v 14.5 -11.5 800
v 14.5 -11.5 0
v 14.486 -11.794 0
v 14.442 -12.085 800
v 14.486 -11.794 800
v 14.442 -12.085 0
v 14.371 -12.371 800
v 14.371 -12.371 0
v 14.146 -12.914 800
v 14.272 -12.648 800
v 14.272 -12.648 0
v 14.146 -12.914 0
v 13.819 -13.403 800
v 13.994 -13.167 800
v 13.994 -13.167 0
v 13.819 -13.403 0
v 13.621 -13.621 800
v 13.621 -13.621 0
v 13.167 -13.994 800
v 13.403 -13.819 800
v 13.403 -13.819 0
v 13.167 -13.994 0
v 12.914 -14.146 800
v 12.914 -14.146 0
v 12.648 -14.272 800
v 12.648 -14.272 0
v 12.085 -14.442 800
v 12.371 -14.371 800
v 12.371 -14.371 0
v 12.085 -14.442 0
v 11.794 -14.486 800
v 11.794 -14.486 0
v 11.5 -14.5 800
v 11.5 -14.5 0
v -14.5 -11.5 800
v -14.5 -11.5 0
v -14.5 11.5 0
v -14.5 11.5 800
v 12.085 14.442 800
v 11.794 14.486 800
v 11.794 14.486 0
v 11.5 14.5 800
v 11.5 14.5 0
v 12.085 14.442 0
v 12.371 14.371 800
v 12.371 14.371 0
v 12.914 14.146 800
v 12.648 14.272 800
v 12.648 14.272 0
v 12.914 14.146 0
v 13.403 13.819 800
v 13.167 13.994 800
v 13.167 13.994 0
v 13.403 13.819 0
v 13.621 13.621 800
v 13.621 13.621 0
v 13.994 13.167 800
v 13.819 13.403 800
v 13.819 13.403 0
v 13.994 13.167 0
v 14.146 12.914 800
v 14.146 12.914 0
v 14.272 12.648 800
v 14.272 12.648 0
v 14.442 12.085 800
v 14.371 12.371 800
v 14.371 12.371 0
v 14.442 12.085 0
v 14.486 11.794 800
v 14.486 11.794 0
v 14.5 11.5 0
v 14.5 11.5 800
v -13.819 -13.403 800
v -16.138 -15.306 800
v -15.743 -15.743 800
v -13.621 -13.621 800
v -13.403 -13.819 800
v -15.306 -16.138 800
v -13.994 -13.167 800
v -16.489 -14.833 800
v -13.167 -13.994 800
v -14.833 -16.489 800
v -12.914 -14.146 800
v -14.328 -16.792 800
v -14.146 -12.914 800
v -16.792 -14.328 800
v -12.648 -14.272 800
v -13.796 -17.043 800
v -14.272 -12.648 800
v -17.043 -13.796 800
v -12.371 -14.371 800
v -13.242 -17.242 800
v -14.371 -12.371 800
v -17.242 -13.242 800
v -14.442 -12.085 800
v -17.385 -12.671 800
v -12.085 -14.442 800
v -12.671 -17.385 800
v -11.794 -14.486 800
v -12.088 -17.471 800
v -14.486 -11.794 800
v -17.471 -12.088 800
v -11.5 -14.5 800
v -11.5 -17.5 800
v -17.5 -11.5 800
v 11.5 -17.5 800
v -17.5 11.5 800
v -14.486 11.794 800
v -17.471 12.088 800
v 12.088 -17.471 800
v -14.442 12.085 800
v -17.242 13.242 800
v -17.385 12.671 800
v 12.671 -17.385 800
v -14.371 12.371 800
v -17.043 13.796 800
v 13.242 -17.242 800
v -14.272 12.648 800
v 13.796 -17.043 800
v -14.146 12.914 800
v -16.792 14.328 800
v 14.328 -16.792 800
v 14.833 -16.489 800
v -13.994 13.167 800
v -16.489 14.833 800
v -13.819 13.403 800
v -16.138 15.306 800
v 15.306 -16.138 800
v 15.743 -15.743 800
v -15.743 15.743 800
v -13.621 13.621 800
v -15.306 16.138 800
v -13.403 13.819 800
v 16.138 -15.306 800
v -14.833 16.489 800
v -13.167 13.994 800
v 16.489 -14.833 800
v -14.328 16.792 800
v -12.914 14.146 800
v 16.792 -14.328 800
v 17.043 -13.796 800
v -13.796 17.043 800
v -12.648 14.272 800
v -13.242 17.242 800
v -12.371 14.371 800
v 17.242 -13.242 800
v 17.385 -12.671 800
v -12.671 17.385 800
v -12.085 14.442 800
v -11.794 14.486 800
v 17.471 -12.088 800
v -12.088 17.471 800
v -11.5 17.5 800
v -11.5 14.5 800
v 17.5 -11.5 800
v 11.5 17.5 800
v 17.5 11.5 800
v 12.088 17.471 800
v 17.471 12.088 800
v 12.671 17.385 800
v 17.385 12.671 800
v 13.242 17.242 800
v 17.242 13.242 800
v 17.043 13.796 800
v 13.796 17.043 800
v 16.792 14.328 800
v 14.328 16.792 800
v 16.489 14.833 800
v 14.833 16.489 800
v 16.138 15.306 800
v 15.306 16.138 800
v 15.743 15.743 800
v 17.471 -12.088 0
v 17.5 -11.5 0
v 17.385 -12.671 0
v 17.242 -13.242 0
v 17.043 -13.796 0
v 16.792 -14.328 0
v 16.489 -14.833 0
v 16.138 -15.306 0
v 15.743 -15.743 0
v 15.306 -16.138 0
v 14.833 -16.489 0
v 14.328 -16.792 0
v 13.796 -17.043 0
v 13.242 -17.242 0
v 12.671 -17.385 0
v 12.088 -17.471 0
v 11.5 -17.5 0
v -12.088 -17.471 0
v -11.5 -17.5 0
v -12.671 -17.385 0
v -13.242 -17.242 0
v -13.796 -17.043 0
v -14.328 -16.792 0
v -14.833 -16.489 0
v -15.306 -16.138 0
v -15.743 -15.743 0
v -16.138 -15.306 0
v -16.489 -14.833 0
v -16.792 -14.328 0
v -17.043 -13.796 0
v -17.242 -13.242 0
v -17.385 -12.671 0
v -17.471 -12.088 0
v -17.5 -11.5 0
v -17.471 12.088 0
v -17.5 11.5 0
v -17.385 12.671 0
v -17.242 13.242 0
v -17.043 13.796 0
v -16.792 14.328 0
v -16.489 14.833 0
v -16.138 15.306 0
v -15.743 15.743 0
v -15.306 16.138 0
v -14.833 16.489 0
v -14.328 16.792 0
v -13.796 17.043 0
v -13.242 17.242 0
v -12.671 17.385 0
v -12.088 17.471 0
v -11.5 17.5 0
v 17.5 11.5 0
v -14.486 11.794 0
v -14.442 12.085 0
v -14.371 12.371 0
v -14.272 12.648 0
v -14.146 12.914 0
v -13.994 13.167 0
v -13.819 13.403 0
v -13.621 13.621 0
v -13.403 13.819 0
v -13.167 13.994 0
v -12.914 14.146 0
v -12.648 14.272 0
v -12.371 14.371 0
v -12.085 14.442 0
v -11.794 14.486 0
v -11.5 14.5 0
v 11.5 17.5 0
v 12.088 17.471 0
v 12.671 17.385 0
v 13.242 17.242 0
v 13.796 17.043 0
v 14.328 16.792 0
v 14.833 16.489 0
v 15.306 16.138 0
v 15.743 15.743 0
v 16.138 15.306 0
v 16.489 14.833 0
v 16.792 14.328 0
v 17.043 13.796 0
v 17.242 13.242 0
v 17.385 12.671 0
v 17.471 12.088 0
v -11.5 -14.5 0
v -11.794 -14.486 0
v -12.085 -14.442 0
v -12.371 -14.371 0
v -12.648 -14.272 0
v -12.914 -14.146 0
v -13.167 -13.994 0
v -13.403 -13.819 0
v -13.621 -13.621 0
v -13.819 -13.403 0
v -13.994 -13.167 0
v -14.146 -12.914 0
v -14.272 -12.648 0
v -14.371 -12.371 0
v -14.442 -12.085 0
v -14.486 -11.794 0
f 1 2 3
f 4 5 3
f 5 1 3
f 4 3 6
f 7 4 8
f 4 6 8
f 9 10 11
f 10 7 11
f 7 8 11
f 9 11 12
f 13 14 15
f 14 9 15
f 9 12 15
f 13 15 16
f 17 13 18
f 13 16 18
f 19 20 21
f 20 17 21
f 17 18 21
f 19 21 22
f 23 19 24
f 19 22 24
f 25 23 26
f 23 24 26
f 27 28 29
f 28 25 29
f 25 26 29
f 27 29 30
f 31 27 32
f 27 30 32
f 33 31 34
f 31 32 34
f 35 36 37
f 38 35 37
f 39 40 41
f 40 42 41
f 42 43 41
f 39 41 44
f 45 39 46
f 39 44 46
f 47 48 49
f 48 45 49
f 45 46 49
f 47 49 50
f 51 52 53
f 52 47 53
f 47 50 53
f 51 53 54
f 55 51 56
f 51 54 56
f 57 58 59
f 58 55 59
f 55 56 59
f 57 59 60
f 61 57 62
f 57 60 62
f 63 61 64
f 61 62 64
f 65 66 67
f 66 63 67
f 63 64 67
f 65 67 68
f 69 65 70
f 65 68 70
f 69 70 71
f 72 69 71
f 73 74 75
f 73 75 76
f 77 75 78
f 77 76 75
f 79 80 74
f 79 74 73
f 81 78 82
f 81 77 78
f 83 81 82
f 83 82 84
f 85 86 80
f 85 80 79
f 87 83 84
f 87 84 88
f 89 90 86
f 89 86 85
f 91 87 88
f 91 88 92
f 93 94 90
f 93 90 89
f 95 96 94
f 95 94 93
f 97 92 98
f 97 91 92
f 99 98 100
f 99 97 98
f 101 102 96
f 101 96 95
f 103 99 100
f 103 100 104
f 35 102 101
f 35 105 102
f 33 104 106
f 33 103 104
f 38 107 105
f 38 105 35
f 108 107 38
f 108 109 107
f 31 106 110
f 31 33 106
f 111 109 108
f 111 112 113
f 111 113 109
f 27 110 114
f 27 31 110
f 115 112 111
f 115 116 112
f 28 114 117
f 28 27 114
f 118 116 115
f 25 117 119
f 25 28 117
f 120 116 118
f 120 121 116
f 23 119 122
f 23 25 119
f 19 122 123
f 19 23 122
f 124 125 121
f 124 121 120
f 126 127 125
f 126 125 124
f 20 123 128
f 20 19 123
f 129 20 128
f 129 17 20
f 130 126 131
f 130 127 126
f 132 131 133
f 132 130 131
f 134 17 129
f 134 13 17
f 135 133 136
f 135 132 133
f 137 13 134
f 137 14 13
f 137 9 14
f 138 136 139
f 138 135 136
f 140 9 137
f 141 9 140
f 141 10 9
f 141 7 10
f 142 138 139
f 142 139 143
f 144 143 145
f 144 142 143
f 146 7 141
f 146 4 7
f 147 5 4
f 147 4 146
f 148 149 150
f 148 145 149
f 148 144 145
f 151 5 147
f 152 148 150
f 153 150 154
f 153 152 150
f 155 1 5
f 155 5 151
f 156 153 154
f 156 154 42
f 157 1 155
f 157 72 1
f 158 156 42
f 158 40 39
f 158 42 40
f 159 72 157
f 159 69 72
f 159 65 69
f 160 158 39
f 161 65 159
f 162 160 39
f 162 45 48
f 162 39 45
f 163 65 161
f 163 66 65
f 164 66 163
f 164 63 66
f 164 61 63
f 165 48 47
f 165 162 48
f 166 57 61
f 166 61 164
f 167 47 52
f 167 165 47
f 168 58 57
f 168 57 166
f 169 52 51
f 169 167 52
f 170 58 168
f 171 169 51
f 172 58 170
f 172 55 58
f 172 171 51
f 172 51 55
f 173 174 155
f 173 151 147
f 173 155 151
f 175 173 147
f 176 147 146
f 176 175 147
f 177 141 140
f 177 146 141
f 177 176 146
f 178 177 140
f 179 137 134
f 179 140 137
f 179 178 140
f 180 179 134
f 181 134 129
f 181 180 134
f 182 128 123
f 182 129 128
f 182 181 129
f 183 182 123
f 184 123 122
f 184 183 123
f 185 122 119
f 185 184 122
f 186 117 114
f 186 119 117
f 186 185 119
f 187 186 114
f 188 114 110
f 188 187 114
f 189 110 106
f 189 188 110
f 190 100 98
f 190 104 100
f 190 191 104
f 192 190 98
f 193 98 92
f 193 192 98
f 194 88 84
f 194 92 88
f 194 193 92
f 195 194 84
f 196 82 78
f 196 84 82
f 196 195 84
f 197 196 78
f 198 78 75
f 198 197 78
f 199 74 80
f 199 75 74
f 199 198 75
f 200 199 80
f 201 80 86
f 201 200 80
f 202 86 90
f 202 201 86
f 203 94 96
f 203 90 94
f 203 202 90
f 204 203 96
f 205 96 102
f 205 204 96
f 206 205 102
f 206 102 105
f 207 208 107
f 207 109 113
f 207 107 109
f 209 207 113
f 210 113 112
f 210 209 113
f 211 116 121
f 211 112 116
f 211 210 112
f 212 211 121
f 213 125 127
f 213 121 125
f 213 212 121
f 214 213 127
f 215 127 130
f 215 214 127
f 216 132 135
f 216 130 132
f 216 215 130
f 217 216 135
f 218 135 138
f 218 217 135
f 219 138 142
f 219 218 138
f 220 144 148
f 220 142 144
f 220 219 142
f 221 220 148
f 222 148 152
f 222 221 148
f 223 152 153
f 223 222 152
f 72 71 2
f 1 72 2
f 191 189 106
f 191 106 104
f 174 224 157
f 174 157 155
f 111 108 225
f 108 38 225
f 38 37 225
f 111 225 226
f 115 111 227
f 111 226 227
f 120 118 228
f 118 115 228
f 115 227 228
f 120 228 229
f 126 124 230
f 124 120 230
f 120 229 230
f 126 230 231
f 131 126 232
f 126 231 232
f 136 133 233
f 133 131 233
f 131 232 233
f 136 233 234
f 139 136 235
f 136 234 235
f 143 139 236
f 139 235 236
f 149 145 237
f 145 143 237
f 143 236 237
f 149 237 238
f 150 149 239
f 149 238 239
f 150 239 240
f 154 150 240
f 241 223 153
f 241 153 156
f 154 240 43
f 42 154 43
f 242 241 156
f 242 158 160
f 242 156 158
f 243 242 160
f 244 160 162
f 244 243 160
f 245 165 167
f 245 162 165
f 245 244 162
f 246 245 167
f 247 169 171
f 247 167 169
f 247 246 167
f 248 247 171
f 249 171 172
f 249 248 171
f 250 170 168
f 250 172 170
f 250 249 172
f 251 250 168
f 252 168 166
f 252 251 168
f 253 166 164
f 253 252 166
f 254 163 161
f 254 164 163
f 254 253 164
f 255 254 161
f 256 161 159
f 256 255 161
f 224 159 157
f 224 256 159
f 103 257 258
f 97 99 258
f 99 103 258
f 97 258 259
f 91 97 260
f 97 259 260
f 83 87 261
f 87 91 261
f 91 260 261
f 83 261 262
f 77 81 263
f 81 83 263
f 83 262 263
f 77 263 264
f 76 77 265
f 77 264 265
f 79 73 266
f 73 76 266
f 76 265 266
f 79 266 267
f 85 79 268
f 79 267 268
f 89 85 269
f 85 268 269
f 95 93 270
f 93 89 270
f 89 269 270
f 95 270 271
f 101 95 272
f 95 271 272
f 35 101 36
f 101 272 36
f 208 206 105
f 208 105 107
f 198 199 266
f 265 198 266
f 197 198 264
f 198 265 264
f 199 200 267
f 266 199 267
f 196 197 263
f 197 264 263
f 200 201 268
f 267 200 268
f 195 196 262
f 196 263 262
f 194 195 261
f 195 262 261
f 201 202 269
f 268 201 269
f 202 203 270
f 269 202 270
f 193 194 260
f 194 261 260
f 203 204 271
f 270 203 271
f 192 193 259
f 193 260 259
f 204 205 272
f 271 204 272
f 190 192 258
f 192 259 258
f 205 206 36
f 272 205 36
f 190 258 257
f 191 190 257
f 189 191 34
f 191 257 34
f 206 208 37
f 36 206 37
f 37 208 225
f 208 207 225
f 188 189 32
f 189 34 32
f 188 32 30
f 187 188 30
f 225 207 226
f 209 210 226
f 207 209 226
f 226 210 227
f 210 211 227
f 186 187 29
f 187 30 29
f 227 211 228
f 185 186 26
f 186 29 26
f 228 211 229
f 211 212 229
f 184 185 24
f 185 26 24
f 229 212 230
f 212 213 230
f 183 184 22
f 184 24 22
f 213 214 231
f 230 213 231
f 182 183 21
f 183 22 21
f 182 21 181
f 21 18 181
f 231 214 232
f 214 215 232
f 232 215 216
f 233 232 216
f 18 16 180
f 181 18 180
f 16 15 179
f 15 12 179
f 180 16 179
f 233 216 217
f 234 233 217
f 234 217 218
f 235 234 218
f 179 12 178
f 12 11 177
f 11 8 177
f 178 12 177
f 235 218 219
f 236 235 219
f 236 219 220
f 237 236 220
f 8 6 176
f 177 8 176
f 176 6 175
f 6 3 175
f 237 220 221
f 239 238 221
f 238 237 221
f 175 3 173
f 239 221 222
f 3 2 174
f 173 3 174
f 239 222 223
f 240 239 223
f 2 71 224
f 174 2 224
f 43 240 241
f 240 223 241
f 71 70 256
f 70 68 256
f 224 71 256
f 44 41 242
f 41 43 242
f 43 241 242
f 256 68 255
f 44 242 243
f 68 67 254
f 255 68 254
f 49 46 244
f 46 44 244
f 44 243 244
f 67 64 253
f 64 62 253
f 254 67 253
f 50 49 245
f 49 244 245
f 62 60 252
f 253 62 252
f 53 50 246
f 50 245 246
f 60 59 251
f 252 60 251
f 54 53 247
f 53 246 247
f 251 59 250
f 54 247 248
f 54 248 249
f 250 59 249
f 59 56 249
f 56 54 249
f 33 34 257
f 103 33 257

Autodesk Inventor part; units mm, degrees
ref_plane "YZ Plane" through (0, 0, 0) normal (1, 0, 0) x (0, 1, 0)
ref_plane "Počáteční rovina" through (0, 0, 0) normal (0, 0, 1) x (1, 0, 0)
ref_plane "Koncová rovina" through (0, 0, 805) normal (0, 0, 1) x (1, 0, 0)
sketch "Náčrt1" plane through (0, 0, 0) normal (0, 0, 1) x (1, 0, 0)
  line L0 (-11.5, 17.5) -> (11.5, 17.5)
  line L1 (17.5, 11.5) -> (17.5, -11.5)
  line L2 (11.5, -17.5) -> (-11.5, -17.5)
  line L3 (-17.5, -11.5) -> (-17.5, 11.5)
  arc A0 (-11.5, 17.5) -> (-17.5, 11.5) centre (-11.5, 11.5) ccw
  arc A1 (17.5, 11.5) -> (11.5, 17.5) centre (11.5, 11.5) ccw
  arc A2 (11.5, -17.5) -> (17.5, -11.5) centre (11.5, -11.5) ccw
  arc A3 (-17.5, -11.5) -> (-11.5, -17.5) centre (-11.5, -11.5) ccw
  line L4 (-26.2397, 0) -> (26.2397, 0) construction
  line L5 (0, -26.2397) -> (0, 26.2397) construction
  arc A4 (-11.5, 14.5) -> (-14.5, 11.5) centre (-11.5, 11.5) ccw
  line L6 (-11.5, 14.5) -> (11.5, 14.5)
  arc A5 (14.5, 11.5) -> (11.5, 14.5) centre (11.5, 11.5) ccw
  line L7 (14.5, 11.5) -> (14.5, -11.5)
  arc A6 (11.5, -14.5) -> (14.5, -11.5) centre (11.5, -11.5) ccw
  line L8 (11.5, -14.5) -> (-11.5, -14.5)
  arc A7 (-14.5, -11.5) -> (-11.5, -14.5) centre (-11.5, -11.5) ccw
  line L9 (-14.5, -11.5) -> (-14.5, 11.5)
  point P0 (-17.5, 17.5)
  point P1 (17.5, -17.5)
  point P2 (17.5, 17.5)
  dimension "b" = 35
  dimension "msp_r" = 6
  dimension "d8" = 17.5
  dimension "d9" = 17.5
  dimension "d10" = 3
extrude "Těleso" add sketch "Náčrt1" along normal blind 800
sketch "Sketch2" plane through (0, 0, 0) normal (0, 0, 1) x (1, 0, 0)
  line L0 (0, 0) -> (10, 0)
ref_plane "Work Plane3" through (0, 0, 0) normal (0, -1, 0) x (1, 0, 0)
sketch "Sketch3" plane through (0, 0, 0) normal (0, -1, 0) x (1, 0, 0)
  line L0 (-2, 0) -> (12, 0)
  line L1 (-2, 805) -> (12, 805)
  dimension "d14" = 805
equation "\"msp_r\" = 2 * ParT"
equation "\"d8\" = d9"
equation "\"d9\" = 0.5 * b"
equation "\"d10\" = ParT"
equation "\"G_OFFSET_START\" = 0"
equation "\"G_OFFSET_END\" = 0"
equation "\"d12\" = G_OFFSET_END + B_L"
equation "\"G_L\" = d14"
equation "\"B_L\" = 805"
equation "\"ParT\" = 3"
properties part number "CSN 426935 - 35x35x3-805" material "Nerezová ocel"
